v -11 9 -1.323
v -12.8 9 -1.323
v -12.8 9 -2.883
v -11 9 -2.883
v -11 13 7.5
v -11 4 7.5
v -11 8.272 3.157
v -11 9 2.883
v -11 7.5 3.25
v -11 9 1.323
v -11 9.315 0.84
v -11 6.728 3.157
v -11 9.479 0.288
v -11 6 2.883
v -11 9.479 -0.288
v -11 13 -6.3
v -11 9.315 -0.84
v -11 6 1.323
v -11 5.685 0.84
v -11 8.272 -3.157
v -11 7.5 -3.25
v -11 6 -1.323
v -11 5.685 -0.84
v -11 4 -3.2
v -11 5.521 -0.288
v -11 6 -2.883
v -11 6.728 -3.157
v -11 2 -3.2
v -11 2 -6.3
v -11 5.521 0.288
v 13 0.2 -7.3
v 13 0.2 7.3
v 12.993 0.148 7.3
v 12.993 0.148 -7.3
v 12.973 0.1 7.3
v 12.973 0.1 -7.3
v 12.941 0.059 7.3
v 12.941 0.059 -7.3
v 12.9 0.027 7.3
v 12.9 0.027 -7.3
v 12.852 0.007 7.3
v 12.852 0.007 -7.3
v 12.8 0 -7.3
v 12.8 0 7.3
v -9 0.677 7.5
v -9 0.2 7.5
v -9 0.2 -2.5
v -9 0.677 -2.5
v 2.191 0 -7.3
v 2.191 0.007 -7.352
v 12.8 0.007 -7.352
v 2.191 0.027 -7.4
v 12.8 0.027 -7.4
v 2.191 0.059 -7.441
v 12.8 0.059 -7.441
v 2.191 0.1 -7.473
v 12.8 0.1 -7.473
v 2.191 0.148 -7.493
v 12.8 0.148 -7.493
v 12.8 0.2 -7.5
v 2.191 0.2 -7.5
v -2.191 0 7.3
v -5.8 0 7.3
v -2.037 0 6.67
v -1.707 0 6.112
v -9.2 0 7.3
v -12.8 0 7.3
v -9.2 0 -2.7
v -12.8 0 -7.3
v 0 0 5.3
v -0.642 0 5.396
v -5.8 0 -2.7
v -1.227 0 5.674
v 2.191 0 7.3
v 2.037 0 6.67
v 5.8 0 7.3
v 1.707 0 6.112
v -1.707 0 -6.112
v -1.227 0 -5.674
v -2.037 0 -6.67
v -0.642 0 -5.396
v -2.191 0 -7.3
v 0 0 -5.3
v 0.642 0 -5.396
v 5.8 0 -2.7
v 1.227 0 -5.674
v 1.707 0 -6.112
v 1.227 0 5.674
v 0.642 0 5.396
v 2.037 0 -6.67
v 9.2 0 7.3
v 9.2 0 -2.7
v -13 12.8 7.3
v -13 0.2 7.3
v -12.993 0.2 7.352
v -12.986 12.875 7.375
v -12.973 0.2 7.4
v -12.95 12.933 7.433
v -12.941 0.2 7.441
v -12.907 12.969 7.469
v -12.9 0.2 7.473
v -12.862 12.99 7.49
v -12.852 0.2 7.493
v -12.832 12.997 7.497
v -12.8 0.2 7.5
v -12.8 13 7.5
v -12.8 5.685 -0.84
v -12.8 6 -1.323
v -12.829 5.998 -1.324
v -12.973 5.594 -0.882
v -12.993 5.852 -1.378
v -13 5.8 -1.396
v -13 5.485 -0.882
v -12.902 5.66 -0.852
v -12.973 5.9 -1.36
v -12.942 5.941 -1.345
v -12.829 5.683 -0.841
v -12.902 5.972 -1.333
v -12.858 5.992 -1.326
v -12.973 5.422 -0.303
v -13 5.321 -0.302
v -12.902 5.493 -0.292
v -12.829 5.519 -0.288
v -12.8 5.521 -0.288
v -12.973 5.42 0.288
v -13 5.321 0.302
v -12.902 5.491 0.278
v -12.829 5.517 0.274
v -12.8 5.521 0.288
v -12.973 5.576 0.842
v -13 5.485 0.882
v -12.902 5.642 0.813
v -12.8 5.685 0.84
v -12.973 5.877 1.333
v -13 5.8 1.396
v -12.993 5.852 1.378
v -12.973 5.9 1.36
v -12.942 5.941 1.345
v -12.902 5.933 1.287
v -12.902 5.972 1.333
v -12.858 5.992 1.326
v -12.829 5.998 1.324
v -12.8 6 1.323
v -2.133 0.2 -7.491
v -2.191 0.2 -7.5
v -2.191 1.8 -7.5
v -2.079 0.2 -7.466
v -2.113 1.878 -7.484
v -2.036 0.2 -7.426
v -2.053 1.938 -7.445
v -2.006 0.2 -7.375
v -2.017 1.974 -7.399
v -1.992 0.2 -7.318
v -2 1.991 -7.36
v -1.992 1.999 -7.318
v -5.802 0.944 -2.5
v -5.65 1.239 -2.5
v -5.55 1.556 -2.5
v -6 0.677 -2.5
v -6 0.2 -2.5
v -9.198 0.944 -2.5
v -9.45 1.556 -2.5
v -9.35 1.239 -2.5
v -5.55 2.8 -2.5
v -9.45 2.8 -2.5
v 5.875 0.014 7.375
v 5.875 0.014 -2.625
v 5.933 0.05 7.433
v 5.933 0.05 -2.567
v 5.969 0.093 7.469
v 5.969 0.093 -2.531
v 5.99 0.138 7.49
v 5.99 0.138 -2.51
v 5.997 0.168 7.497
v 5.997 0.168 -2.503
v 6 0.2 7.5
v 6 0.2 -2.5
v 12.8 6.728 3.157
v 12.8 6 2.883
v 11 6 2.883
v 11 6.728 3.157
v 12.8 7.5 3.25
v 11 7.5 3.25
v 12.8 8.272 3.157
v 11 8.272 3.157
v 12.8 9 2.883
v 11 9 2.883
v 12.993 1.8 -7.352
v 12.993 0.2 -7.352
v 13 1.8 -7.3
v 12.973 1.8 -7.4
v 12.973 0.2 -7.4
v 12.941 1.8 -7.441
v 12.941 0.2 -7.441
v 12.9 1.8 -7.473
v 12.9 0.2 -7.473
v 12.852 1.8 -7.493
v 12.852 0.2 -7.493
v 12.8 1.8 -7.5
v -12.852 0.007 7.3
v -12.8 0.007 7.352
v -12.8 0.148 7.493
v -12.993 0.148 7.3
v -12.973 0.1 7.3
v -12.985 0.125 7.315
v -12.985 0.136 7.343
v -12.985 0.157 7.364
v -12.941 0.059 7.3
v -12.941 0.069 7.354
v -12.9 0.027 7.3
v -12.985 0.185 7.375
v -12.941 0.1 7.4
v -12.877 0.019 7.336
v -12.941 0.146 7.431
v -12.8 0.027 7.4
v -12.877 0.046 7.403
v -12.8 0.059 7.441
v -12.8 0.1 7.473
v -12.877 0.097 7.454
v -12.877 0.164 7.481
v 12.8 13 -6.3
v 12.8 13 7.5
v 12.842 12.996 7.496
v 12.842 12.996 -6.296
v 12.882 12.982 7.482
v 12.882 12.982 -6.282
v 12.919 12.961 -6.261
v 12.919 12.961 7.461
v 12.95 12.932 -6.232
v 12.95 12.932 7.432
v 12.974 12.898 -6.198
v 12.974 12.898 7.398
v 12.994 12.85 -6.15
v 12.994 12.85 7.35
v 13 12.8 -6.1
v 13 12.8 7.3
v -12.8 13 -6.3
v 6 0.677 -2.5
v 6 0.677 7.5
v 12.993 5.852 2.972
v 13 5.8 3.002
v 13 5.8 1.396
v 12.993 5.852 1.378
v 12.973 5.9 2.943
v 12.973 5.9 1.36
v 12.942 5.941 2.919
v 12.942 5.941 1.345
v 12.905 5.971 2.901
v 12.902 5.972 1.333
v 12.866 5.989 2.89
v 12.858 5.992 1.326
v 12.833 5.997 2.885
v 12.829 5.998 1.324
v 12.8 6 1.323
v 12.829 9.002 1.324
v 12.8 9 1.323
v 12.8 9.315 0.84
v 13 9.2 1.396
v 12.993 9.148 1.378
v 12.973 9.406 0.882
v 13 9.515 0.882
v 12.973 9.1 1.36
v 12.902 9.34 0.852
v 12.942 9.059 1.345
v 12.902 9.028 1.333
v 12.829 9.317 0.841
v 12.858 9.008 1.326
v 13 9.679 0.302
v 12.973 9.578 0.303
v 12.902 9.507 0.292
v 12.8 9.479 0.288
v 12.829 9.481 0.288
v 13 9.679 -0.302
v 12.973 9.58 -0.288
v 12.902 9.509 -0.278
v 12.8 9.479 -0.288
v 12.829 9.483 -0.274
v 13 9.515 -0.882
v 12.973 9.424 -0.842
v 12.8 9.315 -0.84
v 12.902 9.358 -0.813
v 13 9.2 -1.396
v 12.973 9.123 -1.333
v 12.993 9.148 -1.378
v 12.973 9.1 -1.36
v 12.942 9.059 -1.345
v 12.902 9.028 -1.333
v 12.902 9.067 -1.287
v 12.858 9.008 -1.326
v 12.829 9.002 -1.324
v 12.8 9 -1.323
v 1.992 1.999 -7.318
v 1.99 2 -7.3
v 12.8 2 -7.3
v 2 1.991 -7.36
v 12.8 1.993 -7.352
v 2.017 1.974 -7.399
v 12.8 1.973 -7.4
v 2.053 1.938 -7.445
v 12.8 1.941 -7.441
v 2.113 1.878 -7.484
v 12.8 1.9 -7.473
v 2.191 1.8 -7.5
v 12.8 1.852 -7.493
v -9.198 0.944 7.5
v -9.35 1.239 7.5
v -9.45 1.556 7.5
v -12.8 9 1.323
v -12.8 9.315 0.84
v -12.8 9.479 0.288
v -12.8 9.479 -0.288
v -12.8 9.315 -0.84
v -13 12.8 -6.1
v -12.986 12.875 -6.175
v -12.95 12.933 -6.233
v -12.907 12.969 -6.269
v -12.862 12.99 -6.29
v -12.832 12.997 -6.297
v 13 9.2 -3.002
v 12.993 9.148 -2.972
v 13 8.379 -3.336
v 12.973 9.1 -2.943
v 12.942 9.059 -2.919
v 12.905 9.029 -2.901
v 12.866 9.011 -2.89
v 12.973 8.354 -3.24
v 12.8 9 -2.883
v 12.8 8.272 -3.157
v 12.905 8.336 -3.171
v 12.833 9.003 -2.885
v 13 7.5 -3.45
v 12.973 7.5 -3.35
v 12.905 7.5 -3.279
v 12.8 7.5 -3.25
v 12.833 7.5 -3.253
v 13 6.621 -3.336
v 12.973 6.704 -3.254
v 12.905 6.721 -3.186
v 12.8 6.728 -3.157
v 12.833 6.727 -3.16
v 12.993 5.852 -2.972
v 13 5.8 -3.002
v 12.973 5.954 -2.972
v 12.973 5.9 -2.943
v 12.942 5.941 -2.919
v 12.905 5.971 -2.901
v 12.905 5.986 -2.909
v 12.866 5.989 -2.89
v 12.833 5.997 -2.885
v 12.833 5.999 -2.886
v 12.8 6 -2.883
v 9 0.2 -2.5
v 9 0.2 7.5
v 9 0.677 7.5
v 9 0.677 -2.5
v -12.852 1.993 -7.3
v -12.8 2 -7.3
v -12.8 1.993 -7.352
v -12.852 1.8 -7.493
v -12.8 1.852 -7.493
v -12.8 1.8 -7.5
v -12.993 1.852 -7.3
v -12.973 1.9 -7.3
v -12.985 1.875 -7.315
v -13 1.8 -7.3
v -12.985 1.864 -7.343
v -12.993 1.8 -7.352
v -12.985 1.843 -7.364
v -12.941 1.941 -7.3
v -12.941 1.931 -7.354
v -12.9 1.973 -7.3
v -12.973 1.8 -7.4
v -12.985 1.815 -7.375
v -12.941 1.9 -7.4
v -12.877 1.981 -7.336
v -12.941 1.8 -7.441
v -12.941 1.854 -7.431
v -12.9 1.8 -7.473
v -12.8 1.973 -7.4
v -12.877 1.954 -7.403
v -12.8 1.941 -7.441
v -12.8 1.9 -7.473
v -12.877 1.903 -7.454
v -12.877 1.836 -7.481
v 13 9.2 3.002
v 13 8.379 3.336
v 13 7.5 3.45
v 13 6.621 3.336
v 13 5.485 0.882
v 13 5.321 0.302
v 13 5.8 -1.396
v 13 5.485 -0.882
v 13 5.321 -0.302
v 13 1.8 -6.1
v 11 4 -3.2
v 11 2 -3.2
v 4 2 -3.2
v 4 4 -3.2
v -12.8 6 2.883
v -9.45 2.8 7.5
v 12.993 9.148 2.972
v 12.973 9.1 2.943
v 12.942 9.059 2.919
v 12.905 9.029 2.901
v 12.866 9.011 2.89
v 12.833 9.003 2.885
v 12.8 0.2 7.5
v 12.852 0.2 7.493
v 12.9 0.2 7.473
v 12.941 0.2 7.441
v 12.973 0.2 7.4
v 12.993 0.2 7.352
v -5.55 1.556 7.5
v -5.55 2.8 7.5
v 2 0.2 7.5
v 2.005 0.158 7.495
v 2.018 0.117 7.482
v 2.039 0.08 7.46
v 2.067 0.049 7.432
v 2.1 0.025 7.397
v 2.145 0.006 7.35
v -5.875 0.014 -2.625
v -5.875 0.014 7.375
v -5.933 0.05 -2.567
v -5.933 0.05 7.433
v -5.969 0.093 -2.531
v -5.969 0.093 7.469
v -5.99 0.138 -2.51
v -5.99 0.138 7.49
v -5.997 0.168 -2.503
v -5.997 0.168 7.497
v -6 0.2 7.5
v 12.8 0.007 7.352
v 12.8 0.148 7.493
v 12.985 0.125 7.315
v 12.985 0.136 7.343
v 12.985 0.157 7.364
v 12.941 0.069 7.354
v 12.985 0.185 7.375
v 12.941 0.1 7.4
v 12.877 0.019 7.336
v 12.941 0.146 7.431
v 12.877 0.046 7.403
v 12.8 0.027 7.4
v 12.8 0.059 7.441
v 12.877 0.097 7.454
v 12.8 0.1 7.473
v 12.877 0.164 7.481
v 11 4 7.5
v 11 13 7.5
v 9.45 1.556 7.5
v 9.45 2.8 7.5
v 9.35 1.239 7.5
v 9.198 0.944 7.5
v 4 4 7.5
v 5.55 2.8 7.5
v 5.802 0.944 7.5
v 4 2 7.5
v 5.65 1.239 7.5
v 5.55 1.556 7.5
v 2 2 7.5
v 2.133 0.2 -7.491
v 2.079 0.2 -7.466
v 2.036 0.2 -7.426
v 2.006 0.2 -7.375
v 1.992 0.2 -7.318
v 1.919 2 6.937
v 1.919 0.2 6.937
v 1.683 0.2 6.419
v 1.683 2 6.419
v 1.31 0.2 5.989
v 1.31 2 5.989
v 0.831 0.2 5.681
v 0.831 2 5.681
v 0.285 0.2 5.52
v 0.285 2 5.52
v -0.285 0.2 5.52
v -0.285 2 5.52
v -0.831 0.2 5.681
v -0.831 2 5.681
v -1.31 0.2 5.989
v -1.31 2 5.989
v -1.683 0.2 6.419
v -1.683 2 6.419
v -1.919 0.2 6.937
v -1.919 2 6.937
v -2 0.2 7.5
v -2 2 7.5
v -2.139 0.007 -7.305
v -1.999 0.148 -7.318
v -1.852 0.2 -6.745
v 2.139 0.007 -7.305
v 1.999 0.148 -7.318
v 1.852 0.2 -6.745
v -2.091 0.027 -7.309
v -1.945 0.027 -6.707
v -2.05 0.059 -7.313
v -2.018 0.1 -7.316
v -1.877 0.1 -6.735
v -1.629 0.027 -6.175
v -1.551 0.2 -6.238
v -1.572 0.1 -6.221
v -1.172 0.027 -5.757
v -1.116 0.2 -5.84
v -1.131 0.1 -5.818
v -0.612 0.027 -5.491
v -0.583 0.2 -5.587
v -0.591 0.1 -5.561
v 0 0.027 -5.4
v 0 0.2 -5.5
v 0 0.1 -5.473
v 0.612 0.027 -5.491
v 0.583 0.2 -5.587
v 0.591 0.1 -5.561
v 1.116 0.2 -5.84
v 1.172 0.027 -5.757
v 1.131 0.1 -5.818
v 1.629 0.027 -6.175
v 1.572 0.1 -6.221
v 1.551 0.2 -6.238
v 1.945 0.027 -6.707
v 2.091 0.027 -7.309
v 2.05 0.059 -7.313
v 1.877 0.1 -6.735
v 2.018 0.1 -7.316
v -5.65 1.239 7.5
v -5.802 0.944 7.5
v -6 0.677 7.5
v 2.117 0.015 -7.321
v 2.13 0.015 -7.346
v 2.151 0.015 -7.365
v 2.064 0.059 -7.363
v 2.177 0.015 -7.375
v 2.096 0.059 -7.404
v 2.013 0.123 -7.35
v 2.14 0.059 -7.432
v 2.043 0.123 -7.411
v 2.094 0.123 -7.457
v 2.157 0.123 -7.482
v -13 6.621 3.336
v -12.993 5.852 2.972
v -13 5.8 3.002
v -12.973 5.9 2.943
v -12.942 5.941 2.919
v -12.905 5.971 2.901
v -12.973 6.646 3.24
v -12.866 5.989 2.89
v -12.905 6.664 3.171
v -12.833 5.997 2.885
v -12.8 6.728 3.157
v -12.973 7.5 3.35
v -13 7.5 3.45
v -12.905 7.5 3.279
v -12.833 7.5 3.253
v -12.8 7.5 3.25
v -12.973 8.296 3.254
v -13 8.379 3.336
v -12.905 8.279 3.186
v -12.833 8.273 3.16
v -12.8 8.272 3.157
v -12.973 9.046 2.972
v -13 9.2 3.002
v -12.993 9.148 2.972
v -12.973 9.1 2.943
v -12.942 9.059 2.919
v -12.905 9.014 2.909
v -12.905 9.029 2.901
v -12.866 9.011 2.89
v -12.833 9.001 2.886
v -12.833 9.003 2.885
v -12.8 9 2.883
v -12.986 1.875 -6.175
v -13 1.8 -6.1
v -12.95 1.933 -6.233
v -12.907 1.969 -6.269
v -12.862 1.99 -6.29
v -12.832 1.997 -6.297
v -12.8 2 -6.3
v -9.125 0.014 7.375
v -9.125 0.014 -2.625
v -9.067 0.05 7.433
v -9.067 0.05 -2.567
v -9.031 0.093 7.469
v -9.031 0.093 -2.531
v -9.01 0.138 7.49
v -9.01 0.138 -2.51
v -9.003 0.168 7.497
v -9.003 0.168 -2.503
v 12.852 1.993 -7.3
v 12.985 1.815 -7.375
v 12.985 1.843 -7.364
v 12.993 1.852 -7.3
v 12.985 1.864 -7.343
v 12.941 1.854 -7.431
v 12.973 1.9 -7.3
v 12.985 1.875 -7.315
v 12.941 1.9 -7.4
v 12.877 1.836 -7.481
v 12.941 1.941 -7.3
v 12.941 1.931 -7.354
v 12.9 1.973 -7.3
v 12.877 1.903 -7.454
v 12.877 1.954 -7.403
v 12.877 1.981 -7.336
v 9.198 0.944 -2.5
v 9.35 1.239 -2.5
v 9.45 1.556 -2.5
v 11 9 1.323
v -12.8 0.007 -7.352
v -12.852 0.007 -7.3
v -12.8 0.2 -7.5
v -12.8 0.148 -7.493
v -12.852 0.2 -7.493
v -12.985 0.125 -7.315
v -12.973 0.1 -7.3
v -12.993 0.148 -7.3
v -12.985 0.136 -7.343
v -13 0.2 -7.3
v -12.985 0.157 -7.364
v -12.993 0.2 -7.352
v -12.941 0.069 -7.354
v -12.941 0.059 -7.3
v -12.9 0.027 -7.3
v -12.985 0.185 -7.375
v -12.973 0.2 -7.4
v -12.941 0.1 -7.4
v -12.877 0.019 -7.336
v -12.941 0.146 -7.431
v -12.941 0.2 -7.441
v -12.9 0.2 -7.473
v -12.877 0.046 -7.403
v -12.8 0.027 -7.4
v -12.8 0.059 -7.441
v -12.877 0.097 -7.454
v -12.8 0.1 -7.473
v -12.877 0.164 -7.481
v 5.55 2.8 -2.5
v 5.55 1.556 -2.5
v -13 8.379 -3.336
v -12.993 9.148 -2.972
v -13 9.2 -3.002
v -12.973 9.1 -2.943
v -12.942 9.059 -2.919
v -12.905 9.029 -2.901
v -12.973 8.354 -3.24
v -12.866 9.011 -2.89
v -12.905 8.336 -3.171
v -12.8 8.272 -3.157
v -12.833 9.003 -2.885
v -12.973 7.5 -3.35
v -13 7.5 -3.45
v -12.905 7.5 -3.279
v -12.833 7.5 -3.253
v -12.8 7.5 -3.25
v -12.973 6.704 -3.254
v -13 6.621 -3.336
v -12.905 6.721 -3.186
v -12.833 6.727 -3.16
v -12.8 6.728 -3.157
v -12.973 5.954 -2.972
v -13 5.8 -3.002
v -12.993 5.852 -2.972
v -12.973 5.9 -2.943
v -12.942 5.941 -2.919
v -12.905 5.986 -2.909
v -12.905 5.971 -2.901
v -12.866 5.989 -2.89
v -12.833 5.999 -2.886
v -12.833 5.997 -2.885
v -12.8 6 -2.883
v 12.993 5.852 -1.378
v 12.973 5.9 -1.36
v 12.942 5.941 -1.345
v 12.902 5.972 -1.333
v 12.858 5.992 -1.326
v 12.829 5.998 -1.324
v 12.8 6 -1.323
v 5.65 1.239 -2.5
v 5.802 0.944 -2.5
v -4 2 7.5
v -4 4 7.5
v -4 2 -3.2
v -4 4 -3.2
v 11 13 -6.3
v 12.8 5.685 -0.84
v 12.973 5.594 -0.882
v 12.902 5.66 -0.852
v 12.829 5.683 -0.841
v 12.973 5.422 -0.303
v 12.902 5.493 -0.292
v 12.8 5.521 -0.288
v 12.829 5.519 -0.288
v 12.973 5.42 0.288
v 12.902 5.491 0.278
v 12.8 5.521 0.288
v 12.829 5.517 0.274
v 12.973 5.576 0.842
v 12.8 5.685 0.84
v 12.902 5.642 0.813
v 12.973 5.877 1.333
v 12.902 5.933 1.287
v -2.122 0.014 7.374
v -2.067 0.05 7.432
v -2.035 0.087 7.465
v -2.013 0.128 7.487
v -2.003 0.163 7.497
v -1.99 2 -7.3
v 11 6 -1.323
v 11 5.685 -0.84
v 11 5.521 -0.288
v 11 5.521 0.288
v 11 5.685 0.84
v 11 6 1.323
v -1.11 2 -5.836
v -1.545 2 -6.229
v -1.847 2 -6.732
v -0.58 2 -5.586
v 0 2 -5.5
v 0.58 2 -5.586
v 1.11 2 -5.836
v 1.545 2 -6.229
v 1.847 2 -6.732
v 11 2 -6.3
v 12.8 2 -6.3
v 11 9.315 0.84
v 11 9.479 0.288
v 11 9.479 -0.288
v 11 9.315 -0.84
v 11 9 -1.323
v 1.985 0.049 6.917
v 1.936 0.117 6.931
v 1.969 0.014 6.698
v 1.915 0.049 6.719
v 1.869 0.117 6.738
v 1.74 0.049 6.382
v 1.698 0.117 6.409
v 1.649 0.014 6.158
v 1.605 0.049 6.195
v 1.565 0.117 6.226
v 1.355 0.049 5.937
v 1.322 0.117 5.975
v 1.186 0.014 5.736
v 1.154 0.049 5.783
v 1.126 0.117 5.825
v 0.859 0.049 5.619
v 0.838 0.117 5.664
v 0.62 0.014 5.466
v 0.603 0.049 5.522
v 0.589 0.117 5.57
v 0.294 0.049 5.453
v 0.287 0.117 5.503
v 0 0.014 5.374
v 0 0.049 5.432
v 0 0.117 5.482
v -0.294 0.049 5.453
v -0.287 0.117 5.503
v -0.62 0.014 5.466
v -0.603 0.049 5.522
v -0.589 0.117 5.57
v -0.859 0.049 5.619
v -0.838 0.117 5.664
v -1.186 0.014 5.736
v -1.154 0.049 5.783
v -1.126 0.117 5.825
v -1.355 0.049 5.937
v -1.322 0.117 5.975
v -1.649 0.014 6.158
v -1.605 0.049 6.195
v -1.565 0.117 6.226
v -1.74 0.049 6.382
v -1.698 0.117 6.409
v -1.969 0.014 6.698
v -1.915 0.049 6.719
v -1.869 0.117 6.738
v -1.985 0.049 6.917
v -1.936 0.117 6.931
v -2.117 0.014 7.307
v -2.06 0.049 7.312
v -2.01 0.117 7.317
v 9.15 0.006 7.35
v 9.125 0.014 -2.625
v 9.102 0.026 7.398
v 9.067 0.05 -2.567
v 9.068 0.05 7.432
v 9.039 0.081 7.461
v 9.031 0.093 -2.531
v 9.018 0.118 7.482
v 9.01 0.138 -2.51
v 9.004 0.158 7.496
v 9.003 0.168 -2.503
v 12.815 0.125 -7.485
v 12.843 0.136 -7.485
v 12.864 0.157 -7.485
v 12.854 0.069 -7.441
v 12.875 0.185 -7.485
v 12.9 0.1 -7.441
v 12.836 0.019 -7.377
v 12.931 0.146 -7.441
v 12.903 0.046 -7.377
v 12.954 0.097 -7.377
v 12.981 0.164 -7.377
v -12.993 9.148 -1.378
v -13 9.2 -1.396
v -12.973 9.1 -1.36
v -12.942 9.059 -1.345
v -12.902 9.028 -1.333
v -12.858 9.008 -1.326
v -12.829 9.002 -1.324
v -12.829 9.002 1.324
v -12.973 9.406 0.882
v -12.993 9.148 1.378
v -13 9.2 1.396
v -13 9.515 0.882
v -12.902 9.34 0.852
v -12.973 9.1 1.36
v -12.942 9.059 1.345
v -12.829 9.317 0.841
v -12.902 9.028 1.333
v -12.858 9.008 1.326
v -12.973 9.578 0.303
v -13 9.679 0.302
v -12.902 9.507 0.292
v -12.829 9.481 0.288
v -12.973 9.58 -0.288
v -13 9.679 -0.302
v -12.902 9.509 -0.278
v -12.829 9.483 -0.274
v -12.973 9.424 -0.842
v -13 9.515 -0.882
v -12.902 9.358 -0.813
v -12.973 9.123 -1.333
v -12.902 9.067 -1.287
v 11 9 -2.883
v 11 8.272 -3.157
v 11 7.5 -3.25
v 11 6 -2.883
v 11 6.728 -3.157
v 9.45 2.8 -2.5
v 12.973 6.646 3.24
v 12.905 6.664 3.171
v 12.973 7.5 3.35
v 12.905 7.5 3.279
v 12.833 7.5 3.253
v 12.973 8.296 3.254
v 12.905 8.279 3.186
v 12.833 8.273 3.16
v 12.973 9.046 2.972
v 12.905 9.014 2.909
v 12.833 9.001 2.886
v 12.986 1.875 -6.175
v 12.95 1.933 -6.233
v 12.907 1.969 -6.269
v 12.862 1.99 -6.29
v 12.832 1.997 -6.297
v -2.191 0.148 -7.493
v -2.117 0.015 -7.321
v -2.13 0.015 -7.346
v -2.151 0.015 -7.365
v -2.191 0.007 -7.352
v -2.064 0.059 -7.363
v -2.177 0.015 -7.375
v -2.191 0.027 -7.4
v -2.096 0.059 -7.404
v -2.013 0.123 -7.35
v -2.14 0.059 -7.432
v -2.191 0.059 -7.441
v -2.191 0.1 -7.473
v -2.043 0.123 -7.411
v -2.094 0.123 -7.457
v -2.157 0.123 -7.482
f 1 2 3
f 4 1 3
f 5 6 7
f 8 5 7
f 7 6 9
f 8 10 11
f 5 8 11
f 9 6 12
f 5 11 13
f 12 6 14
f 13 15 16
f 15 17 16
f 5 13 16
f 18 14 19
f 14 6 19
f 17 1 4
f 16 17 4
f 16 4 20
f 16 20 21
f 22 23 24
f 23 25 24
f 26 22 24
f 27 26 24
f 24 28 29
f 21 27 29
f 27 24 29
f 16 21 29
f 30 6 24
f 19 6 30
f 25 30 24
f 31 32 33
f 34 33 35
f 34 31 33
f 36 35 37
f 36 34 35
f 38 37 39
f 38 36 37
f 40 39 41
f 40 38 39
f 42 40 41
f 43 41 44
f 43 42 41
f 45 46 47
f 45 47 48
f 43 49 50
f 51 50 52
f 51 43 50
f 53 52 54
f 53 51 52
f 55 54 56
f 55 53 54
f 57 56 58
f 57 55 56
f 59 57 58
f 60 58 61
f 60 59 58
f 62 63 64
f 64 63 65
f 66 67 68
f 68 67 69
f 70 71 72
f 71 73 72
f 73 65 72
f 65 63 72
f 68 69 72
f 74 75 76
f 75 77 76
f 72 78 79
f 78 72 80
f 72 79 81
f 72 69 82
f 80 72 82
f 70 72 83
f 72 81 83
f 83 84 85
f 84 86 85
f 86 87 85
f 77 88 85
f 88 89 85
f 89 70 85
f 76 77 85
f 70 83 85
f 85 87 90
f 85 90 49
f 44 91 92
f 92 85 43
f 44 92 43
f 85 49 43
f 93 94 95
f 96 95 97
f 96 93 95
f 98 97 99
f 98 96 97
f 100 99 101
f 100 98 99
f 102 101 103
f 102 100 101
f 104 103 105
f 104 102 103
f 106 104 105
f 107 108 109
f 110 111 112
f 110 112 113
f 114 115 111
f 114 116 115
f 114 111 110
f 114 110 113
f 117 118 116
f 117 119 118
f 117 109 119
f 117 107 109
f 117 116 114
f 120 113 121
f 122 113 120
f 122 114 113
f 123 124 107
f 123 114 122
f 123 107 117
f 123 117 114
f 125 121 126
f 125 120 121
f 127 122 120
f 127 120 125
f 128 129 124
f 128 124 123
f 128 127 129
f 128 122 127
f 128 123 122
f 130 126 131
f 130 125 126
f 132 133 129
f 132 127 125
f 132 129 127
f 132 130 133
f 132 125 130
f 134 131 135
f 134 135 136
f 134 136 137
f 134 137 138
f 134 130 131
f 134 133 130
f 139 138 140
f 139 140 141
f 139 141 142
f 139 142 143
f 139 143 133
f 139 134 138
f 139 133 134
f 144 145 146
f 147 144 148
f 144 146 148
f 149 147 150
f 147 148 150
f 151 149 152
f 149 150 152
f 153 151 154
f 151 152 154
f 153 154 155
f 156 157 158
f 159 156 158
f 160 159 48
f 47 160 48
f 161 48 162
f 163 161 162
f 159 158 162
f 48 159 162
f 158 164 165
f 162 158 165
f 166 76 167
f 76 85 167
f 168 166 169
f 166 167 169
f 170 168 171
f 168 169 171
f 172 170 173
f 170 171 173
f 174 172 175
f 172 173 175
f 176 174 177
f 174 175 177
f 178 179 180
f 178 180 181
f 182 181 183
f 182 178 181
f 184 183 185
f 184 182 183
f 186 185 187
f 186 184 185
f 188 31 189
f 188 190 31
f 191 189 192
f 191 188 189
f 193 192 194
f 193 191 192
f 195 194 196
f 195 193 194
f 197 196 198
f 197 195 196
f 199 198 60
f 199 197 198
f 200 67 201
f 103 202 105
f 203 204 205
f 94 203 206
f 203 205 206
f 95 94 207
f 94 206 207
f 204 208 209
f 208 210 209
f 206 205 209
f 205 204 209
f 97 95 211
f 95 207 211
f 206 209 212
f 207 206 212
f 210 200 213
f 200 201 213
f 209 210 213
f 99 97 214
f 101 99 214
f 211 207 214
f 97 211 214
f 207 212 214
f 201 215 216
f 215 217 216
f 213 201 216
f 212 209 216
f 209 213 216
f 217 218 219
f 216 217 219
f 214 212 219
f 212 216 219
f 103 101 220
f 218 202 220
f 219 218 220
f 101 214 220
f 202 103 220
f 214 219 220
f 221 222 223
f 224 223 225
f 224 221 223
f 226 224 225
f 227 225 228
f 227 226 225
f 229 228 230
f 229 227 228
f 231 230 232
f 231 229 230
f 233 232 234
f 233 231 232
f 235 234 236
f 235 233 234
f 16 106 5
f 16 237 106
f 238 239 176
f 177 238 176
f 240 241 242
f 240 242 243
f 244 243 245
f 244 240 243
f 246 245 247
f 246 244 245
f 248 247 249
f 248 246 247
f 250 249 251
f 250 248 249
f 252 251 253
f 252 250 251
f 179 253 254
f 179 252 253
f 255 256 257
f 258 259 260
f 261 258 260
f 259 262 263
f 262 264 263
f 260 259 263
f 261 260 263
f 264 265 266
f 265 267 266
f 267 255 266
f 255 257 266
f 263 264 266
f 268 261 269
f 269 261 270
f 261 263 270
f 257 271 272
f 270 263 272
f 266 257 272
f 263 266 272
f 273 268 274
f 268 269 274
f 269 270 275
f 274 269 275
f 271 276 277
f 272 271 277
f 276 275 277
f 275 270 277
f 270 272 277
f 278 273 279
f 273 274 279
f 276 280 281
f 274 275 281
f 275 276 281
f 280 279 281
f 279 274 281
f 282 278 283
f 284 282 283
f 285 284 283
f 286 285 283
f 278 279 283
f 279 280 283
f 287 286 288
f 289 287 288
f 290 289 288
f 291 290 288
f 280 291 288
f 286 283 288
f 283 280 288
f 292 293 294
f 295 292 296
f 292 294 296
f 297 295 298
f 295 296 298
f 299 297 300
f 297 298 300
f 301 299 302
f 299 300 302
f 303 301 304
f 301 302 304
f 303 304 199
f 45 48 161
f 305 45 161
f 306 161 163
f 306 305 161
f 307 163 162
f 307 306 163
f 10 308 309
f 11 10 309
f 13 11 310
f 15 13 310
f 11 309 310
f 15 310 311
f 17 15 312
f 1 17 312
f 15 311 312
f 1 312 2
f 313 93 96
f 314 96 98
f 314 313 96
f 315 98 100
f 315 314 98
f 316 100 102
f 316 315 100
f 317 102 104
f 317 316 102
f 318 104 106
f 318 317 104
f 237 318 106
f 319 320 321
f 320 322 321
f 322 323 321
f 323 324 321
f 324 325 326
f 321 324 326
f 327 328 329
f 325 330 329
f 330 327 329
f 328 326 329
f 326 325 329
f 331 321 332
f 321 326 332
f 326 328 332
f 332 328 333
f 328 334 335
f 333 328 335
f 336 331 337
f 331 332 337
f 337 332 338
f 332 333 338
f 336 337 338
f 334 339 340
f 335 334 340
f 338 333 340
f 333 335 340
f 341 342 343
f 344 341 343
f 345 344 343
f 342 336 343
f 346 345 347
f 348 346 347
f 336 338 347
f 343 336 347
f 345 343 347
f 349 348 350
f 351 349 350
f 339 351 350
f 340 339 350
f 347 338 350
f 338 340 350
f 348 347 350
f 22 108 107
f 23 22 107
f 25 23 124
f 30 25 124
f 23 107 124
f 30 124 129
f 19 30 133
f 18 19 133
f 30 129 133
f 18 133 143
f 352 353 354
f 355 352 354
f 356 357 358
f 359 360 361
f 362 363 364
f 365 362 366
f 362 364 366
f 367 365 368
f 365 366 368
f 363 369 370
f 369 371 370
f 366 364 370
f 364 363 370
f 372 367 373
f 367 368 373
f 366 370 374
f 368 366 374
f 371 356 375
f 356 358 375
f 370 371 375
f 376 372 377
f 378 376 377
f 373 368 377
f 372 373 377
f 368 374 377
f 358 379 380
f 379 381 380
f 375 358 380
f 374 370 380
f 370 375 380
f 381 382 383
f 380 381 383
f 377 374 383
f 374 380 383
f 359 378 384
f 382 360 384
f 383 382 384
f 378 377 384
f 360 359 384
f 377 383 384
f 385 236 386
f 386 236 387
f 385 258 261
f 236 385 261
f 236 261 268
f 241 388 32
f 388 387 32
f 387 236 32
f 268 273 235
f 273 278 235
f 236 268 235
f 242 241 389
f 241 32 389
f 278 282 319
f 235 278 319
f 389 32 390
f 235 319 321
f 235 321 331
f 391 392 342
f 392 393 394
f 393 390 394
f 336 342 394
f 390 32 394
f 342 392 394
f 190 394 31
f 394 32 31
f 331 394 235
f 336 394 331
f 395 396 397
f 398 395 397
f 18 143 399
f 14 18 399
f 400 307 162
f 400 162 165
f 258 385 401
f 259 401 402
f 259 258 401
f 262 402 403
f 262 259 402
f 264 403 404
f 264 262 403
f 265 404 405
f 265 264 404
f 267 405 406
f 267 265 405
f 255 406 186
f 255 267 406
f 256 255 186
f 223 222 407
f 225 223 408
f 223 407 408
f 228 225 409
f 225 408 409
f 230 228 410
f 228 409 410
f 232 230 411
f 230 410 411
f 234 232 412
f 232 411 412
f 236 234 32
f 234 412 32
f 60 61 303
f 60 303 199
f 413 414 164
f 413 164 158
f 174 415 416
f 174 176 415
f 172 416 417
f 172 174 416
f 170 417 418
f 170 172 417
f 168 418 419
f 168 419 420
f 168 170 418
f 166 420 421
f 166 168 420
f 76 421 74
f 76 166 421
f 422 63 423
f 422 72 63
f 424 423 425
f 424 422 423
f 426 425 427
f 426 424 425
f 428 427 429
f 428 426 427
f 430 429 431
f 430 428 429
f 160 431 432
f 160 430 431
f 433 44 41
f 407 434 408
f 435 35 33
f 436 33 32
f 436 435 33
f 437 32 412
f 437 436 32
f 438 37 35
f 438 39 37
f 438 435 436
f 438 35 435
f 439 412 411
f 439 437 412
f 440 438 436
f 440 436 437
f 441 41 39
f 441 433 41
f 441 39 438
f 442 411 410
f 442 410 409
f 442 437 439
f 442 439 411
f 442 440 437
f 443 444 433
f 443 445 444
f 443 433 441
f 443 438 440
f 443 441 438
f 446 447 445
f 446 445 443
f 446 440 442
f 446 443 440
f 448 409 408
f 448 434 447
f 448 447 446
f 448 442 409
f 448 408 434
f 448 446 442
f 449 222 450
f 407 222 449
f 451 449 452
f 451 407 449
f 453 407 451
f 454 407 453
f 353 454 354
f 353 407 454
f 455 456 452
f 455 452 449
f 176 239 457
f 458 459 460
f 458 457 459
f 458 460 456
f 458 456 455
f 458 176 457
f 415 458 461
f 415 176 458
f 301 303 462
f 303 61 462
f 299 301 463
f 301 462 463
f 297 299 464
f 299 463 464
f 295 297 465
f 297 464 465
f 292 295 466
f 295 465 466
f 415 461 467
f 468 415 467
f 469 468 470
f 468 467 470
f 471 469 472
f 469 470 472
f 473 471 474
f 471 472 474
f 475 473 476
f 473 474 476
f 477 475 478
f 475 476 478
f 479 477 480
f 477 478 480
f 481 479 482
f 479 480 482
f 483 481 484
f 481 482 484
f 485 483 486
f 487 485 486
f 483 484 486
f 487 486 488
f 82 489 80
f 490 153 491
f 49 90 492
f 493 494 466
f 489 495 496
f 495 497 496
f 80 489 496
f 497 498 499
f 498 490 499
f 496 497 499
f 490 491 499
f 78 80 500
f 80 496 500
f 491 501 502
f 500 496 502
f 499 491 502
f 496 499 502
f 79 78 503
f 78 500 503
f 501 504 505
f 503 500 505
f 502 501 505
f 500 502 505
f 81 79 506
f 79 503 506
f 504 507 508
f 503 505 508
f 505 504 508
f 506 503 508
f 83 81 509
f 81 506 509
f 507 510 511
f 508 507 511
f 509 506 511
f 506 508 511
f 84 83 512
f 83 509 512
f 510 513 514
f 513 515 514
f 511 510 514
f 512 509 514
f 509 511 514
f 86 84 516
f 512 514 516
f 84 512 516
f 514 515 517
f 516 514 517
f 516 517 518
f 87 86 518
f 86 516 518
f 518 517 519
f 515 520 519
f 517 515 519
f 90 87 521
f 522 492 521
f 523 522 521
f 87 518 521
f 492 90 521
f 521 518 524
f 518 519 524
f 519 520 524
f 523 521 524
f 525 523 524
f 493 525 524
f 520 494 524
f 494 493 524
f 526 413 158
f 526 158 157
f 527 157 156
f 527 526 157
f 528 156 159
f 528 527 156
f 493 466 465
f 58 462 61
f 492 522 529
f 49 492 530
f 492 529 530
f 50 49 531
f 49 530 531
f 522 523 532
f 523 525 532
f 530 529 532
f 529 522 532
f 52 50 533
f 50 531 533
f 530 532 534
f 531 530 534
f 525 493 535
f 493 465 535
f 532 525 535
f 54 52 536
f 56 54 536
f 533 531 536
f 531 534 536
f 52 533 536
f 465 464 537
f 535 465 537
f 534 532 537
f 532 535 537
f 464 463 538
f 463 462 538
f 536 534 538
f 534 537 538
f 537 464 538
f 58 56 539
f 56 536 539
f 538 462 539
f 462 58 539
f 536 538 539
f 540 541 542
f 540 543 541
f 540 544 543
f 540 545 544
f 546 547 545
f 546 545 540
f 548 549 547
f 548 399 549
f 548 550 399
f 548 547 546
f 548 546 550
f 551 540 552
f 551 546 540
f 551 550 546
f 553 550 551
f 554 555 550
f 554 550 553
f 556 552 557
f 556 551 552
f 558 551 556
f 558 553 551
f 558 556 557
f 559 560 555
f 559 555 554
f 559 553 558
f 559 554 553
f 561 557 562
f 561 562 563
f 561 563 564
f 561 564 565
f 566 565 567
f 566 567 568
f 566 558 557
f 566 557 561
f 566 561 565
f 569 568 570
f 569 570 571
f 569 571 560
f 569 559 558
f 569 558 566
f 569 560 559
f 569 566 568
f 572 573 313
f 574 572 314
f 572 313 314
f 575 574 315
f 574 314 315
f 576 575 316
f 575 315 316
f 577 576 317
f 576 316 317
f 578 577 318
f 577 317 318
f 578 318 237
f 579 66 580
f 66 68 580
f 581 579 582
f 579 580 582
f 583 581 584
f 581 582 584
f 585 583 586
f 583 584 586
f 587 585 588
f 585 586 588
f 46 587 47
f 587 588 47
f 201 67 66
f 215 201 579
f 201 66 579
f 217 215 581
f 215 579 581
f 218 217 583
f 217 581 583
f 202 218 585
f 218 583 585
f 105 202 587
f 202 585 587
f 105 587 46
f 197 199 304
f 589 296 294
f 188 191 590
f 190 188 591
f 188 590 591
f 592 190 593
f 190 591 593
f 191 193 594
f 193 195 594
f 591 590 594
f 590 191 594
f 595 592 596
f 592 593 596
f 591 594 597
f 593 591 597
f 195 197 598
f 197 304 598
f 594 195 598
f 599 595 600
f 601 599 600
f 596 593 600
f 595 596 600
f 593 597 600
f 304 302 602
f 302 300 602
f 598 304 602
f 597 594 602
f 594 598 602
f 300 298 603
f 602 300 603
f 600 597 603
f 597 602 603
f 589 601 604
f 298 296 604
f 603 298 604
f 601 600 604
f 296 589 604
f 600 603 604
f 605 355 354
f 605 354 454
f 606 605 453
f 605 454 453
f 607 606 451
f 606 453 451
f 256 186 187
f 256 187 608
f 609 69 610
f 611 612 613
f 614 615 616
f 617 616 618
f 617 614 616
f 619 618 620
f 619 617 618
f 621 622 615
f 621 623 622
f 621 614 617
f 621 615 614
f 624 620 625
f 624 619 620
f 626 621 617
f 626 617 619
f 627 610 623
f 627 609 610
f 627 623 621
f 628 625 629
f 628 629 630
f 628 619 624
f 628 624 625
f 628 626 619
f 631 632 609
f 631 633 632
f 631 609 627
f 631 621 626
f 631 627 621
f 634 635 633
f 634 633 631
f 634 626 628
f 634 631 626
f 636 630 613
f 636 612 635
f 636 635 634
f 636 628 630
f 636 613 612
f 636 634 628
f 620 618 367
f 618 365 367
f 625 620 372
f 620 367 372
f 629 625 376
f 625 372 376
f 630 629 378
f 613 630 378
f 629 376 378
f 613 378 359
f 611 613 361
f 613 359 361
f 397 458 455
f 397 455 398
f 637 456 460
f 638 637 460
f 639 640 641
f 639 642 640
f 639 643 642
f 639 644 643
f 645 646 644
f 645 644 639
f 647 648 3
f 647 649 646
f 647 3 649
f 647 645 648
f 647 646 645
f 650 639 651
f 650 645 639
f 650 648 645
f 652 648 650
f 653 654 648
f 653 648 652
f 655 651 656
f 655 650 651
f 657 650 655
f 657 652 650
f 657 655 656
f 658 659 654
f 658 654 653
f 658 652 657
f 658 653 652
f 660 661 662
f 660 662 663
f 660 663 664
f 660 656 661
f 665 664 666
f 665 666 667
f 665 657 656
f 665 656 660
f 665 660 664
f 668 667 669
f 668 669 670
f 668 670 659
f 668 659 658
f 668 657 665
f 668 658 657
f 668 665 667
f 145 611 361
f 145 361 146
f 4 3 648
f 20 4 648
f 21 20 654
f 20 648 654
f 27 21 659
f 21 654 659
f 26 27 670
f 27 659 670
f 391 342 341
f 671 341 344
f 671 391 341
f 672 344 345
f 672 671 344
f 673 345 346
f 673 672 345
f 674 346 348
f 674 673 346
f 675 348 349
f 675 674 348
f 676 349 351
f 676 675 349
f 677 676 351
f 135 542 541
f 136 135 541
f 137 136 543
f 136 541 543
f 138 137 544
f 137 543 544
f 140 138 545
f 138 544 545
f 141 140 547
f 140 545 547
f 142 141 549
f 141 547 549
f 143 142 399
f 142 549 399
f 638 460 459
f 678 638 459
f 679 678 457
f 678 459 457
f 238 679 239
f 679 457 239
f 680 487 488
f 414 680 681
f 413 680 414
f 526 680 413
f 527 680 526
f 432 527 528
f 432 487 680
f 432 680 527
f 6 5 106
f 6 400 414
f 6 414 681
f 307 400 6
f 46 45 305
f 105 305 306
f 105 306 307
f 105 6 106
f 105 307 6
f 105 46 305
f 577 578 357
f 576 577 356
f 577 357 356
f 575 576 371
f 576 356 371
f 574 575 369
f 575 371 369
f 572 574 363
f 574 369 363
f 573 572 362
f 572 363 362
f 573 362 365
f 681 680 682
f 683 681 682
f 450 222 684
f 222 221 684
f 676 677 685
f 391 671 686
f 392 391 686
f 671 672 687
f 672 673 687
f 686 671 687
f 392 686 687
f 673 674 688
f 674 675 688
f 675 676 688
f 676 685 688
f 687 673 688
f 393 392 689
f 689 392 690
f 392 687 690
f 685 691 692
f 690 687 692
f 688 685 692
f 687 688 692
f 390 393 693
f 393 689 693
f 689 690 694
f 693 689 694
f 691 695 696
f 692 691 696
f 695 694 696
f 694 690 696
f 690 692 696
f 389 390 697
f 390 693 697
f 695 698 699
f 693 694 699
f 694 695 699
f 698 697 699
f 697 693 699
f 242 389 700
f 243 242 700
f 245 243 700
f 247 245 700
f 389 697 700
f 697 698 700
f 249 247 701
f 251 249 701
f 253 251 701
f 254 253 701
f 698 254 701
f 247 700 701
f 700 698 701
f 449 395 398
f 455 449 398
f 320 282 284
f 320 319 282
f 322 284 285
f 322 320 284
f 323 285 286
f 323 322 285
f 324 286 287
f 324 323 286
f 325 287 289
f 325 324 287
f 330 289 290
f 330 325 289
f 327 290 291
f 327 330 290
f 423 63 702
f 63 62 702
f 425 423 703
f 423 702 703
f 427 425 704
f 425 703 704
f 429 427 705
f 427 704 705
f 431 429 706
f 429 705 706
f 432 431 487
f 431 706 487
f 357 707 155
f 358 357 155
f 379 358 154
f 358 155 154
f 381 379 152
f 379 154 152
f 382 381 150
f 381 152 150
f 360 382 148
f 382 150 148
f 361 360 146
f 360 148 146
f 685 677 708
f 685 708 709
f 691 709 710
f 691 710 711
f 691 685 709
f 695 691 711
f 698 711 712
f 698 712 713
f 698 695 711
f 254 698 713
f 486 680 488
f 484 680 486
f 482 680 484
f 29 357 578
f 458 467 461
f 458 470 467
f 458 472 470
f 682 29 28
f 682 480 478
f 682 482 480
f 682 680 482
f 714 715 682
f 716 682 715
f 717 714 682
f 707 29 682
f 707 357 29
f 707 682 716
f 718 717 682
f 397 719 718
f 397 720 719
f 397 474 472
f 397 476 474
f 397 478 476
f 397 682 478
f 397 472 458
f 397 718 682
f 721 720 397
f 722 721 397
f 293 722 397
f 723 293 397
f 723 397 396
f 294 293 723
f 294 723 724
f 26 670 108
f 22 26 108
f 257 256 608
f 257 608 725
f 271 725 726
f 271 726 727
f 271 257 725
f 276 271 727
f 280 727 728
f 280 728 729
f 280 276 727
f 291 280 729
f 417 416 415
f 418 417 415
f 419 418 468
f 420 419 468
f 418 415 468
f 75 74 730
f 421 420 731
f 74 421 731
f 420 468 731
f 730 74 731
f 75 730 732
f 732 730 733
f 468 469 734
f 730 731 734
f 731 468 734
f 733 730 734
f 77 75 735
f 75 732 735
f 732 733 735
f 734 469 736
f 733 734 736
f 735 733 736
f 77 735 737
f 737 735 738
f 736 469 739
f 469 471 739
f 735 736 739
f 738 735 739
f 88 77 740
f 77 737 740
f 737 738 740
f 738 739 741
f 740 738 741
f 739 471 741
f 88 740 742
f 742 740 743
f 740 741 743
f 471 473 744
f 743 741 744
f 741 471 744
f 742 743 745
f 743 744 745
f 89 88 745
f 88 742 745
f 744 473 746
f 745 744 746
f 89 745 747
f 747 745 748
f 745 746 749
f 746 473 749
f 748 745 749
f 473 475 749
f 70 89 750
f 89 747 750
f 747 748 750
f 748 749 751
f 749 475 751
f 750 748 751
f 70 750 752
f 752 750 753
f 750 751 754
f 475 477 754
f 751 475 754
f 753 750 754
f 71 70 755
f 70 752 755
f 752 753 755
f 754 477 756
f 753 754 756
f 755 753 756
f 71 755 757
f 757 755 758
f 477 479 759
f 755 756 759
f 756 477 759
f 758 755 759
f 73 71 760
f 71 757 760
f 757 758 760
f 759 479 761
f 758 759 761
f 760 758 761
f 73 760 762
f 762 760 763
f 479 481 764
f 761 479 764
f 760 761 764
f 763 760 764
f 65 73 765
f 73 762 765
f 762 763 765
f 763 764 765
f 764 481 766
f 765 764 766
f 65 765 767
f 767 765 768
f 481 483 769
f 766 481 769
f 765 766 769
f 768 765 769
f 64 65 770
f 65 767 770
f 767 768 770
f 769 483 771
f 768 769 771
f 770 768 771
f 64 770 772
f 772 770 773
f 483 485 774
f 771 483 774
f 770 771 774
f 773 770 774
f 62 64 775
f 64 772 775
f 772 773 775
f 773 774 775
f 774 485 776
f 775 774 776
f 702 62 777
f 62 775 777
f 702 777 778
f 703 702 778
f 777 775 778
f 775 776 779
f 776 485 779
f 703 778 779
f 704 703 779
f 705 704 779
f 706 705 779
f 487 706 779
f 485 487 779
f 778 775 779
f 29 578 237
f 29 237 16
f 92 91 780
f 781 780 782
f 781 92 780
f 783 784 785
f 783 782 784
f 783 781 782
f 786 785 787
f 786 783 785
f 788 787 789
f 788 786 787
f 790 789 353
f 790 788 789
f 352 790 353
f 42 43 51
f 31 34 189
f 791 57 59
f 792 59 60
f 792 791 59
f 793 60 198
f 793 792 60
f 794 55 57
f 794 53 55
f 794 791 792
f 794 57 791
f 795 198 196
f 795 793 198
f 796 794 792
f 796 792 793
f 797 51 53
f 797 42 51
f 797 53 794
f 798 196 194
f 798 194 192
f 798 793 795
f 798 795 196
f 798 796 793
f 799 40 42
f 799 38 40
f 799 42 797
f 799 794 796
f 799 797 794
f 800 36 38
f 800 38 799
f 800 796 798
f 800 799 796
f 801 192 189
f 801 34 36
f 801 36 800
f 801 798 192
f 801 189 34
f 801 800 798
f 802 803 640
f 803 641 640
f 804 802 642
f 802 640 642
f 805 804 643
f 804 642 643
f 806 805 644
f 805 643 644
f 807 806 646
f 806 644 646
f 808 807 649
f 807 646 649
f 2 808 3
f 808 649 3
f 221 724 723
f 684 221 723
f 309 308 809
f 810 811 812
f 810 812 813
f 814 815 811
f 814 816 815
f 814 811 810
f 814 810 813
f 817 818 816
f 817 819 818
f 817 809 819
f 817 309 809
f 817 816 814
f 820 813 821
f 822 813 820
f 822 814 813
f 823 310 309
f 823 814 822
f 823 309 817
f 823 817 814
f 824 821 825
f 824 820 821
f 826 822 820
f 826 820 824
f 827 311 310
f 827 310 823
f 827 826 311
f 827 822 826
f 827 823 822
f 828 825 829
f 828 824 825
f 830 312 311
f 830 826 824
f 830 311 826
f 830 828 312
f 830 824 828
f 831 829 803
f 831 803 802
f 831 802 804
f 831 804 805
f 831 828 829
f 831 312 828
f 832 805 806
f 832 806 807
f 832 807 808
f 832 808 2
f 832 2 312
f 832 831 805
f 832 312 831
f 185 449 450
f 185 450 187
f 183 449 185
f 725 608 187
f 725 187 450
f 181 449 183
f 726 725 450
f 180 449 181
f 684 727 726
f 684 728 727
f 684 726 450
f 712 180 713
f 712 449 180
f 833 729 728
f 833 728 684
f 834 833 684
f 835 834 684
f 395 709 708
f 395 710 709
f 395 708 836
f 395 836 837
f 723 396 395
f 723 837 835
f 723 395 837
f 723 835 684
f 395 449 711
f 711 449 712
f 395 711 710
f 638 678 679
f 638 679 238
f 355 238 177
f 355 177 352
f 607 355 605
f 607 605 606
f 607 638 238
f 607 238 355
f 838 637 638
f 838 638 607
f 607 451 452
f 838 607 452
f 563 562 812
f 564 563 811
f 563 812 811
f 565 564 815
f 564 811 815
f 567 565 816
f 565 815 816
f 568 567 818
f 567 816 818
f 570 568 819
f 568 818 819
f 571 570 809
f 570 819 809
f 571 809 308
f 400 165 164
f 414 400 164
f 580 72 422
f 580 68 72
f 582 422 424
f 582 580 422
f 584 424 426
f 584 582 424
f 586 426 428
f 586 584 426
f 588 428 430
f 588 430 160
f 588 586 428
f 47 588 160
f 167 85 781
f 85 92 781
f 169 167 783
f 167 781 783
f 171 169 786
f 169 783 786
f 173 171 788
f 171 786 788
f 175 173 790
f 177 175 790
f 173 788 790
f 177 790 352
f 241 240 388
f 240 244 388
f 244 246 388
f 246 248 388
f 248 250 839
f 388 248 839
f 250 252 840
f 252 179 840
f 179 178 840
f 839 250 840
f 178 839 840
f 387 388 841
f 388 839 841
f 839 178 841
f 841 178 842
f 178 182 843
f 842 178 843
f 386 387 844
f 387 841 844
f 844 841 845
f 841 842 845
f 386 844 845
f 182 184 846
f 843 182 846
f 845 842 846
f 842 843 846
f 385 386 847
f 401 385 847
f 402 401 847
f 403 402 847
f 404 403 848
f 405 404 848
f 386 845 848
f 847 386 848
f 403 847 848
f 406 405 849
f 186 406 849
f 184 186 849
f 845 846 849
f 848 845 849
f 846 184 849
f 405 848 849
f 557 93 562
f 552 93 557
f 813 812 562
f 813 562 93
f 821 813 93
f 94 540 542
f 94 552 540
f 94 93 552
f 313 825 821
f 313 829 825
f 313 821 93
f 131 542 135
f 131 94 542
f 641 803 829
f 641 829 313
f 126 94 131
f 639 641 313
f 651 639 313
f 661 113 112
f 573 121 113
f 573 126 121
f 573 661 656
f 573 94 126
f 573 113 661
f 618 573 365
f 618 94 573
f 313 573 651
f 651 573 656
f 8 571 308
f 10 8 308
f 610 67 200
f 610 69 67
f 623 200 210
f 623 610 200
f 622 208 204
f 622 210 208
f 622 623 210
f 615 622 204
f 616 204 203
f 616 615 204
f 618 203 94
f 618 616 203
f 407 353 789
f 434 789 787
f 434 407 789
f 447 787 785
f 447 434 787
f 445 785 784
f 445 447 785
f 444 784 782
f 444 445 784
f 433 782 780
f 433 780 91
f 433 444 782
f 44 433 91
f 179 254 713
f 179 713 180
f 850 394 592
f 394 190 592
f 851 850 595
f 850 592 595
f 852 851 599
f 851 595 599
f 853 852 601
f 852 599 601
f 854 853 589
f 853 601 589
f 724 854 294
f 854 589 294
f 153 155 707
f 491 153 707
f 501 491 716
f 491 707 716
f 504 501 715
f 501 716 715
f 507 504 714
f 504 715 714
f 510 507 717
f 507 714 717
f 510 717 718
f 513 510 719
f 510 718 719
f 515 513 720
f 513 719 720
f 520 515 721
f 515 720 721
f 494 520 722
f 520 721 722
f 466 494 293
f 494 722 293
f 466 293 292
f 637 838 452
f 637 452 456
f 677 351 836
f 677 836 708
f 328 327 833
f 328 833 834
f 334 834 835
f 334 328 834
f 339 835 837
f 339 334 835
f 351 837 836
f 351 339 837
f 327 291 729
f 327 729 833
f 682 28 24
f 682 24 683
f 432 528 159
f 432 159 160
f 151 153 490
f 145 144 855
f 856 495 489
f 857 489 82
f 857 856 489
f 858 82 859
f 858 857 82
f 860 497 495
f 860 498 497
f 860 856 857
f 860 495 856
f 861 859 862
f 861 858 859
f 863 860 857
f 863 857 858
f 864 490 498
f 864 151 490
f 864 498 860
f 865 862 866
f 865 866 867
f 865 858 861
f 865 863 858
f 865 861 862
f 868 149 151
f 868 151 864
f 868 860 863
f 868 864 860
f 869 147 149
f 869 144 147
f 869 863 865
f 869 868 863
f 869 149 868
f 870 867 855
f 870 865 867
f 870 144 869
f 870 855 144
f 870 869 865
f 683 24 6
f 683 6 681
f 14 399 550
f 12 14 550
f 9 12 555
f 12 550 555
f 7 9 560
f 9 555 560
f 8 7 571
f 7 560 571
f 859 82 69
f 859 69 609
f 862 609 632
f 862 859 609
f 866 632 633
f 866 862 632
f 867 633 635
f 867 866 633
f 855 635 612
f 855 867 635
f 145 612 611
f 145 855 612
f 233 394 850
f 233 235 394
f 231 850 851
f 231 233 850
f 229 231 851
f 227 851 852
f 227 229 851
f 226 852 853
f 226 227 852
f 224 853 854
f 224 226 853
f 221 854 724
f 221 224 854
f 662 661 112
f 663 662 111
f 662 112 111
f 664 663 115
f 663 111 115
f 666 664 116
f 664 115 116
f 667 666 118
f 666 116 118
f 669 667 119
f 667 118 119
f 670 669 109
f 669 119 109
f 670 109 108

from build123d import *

# Parameters (mm, degrees)
SKETCH_1_W          = 26
SKETCH_1_H          = 15
EXTRUDE_1_DEPTH     = 2
SKETCH_2_W          = 2
SKETCH_2_H          = 13.8
EXTRUDE_2_DEPTH     = 11
SKETCH_3_W          = 7
SKETCH_3_H          = 10.7
EXTRUDE_3_DEPTH     = 2
CUT_EXTRUDE_1_REACH = 32.021
CUT_EXTRUDE_2_DEPTH = 10
CUT_EXTRUDE_3_REACH = 20.608
SKETCH_6_R          = 2
FILLET_1_R          = 0.2


with BuildPart() as part:
    # 草图1 → 凸台-拉伸1 (new body)
    with BuildSketch(Plane(origin=(0, 0, 0), x_dir=(1, 0, 0), z_dir=(0, 1, 0))):
        Rectangle(SKETCH_1_W, SKETCH_1_H)
    extrude(amount=EXTRUDE_1_DEPTH)

    # 草图2 → 凸台-拉伸2 (add)
    with BuildSketch(Plane(origin=(0, 2, 0), x_dir=(1, 0, 0), z_dir=(0, 1, 0))):
        with Locations((-12, -0.6)):
            Rectangle(SKETCH_2_W, SKETCH_2_H)
    extrude_2 = extrude(amount=EXTRUDE_2_DEPTH)

    # 草图3 → 凸台-拉伸3 (add)
    with BuildSketch(Plane(origin=(0, 2, 0), x_dir=(1, 0, 0), z_dir=(0, 1, 0))):
        with Locations((-7.5, -2.15)):
            Rectangle(SKETCH_3_W, SKETCH_3_H)
    extrude_3 = extrude(amount=EXTRUDE_3_DEPTH)

    # 草图4 → 切除-拉伸1 (cut, up to next)
    with BuildSketch(Plane.ZY.offset(13), mode=Mode.PRIVATE) as cut_extrude_1_sk1:
        with BuildLine():
            Line((-2.883140649, 6), (-1.322875656, 6))
            ThreePointArc((-1.322875656, 6), (0, 5.5), (1.322875656, 6))
            Line((1.322875656, 6), (2.883140649, 6))
            ThreePointArc((2.883140649, 6), (3.25, 7.5), (2.883140649, 9))
            Line((2.883140649, 9), (1.322875656, 9))
            ThreePointArc((1.322875656, 9), (0, 9.5), (-1.322875656, 9))
            Line((-1.322875656, 9), (-2.883140649, 9))
            ThreePointArc((-2.883140649, 9), (-3.25, 7.5), (-2.883140649, 6))
        make_face()
    cut_extrude_1_tool1 = extrude(cut_extrude_1_sk1.sketch, amount=-CUT_EXTRUDE_1_REACH, mode=Mode.PRIVATE) & part.part
    cut_extrude_1 = cut_extrude_1_tool1.solids().sort_by_distance((-13, 7.5, 0))[0]
    add(cut_extrude_1, mode=Mode.SUBTRACT)

    # 草图5 → 切除-拉伸2 (cut)
    with BuildSketch(Plane.XY.offset(7.5)):
        with BuildLine():
            Line((-6, 0), (-9, 0))
            Line((-9, 0), (-9, 0.677124344))
            ThreePointArc((-9, 0.677124344), (-9.280042303, 1.088161527), (-9.45, 1.555590279))
            Line((-9.45, 1.555590279), (-9.45, 2.8))
            Line((-9.45, 2.8), (-5.55, 2.8))
            Line((-5.55, 2.8), (-5.55, 1.555590279))
            ThreePointArc((-5.55, 1.555590279), (-5.719957697, 1.088161527), (-6, 0.677124344))
            Line((-6, 0.677124344), (-6, 0))
        make_face()
    cut_extrude_2 = extrude(amount=-CUT_EXTRUDE_2_DEPTH, mode=Mode.SUBTRACT)

    # 镜向1: 凸台-拉伸2, 凸台-拉伸3, 切除-拉伸1, 切除-拉伸2 across plane
    add(extrude_2.mirror(Plane(origin=(0, 0, 0), x_dir=(0, 0, 1), z_dir=(1, 0, 0))))
    add(extrude_3.mirror(Plane(origin=(0, 0, 0), x_dir=(0, 0, 1), z_dir=(1, 0, 0))))
    add(cut_extrude_1.mirror(Plane(origin=(0, 0, 0), x_dir=(0, 0, 1), z_dir=(1, 0, 0))), mode=Mode.SUBTRACT)
    add(cut_extrude_2.mirror(Plane(origin=(0, 0, 0), x_dir=(0, 0, 1), z_dir=(1, 0, 0))), mode=Mode.SUBTRACT)

    # 草图6 → 切除-拉伸3 (cut, up to next)
    with BuildSketch(Plane(origin=(0, 2, 0), x_dir=(1, 0, 0), z_dir=(0, 1, 0)), mode=Mode.PRIVATE) as cut_extrude_3_sk1:
        with Locations((0, -7.5)):
            Circle(SKETCH_6_R)
    cut_extrude_3_tool1 = extrude(cut_extrude_3_sk1.sketch, amount=-CUT_EXTRUDE_3_REACH, mode=Mode.PRIVATE) & part.part
    # 草图6 → 切除-拉伸3 (cut, up to next)
    with BuildSketch(Plane(origin=(0, 2, 0), x_dir=(1, 0, 0), z_dir=(0, 1, 0)), mode=Mode.PRIVATE) as cut_extrude_3_sk2:
        with Locations((0, 7.5)):
            Circle(SKETCH_6_R)
    cut_extrude_3_tool2 = extrude(cut_extrude_3_sk2.sketch, amount=-CUT_EXTRUDE_3_REACH, mode=Mode.PRIVATE) & part.part
    add(cut_extrude_3_tool1.solids().sort_by_distance((0, 2, 7.5))[0], mode=Mode.SUBTRACT)
    add(cut_extrude_3_tool2.solids().sort_by_distance((0, 2, -7.5))[0], mode=Mode.SUBTRACT)

    # 圆角1
    fillet_1_edges = [part.edges().sort_by_distance(p)[0] for p in [
        (13, 5.5, 0),
        (13, 6, 2.103008152),
        (13, 7.5, 3.25),
        (13, 9, 2.103008152),
        (13, 9.5, 0),
        (13, 9, -2.103008152),
        (13, 7.5, -3.25),
        (13, 6, -2.103008152),
        (11, 0, 7.5),
        (6, 0, 2.5),
        (9, 0, 2.5),
        (7.5, 0, -2.5),
        (-13, 7.5, -6.3),
        (4, 0, 7.5),
        (0, 0, 5.5),
        (-13, 13, 0.6),
        (-7.5, 0, -7.5),
        (-7.5, 2, -7.5),
        (2, 1, -7.5),
        (-2, 1, -7.5),
        (0, 0, -5.5),
        (7.5, 2, -7.5),
        (13, 0, 0),
        (-11, 0, 7.5),
        (-13, 5.5, 0),
        (-13, 6, 2.103008152),
        (-13, 7.5, 3.25),
        (-13, 9, 2.103008152),
        (-13, 9.5, 0),
        (-13, 9, -2.103008152),
        (-13, 7.5, -3.25),
        (-13, 6, -2.103008152),
        (-13, 0, 0),
        (7.5, 0, -7.5),
        (-4, 0, 7.5),
        (-13, 2, -6.9),
        (13, 1, -7.5),
        (-7.5, 0, -2.5),
        (-6, 0, 2.5),
        (-9, 0, 2.5),
        (13, 6.5, 7.5),
        (-13, 6.5, 7.5),
        (-13, 1, -7.5),
        (13, 2, -6.9),
        (13, 13, 0.6),
        (13, 7.5, -6.3),
    ]]
    fillet(fillet_1_edges, radius=FILLET_1_R)


solid = part.part
